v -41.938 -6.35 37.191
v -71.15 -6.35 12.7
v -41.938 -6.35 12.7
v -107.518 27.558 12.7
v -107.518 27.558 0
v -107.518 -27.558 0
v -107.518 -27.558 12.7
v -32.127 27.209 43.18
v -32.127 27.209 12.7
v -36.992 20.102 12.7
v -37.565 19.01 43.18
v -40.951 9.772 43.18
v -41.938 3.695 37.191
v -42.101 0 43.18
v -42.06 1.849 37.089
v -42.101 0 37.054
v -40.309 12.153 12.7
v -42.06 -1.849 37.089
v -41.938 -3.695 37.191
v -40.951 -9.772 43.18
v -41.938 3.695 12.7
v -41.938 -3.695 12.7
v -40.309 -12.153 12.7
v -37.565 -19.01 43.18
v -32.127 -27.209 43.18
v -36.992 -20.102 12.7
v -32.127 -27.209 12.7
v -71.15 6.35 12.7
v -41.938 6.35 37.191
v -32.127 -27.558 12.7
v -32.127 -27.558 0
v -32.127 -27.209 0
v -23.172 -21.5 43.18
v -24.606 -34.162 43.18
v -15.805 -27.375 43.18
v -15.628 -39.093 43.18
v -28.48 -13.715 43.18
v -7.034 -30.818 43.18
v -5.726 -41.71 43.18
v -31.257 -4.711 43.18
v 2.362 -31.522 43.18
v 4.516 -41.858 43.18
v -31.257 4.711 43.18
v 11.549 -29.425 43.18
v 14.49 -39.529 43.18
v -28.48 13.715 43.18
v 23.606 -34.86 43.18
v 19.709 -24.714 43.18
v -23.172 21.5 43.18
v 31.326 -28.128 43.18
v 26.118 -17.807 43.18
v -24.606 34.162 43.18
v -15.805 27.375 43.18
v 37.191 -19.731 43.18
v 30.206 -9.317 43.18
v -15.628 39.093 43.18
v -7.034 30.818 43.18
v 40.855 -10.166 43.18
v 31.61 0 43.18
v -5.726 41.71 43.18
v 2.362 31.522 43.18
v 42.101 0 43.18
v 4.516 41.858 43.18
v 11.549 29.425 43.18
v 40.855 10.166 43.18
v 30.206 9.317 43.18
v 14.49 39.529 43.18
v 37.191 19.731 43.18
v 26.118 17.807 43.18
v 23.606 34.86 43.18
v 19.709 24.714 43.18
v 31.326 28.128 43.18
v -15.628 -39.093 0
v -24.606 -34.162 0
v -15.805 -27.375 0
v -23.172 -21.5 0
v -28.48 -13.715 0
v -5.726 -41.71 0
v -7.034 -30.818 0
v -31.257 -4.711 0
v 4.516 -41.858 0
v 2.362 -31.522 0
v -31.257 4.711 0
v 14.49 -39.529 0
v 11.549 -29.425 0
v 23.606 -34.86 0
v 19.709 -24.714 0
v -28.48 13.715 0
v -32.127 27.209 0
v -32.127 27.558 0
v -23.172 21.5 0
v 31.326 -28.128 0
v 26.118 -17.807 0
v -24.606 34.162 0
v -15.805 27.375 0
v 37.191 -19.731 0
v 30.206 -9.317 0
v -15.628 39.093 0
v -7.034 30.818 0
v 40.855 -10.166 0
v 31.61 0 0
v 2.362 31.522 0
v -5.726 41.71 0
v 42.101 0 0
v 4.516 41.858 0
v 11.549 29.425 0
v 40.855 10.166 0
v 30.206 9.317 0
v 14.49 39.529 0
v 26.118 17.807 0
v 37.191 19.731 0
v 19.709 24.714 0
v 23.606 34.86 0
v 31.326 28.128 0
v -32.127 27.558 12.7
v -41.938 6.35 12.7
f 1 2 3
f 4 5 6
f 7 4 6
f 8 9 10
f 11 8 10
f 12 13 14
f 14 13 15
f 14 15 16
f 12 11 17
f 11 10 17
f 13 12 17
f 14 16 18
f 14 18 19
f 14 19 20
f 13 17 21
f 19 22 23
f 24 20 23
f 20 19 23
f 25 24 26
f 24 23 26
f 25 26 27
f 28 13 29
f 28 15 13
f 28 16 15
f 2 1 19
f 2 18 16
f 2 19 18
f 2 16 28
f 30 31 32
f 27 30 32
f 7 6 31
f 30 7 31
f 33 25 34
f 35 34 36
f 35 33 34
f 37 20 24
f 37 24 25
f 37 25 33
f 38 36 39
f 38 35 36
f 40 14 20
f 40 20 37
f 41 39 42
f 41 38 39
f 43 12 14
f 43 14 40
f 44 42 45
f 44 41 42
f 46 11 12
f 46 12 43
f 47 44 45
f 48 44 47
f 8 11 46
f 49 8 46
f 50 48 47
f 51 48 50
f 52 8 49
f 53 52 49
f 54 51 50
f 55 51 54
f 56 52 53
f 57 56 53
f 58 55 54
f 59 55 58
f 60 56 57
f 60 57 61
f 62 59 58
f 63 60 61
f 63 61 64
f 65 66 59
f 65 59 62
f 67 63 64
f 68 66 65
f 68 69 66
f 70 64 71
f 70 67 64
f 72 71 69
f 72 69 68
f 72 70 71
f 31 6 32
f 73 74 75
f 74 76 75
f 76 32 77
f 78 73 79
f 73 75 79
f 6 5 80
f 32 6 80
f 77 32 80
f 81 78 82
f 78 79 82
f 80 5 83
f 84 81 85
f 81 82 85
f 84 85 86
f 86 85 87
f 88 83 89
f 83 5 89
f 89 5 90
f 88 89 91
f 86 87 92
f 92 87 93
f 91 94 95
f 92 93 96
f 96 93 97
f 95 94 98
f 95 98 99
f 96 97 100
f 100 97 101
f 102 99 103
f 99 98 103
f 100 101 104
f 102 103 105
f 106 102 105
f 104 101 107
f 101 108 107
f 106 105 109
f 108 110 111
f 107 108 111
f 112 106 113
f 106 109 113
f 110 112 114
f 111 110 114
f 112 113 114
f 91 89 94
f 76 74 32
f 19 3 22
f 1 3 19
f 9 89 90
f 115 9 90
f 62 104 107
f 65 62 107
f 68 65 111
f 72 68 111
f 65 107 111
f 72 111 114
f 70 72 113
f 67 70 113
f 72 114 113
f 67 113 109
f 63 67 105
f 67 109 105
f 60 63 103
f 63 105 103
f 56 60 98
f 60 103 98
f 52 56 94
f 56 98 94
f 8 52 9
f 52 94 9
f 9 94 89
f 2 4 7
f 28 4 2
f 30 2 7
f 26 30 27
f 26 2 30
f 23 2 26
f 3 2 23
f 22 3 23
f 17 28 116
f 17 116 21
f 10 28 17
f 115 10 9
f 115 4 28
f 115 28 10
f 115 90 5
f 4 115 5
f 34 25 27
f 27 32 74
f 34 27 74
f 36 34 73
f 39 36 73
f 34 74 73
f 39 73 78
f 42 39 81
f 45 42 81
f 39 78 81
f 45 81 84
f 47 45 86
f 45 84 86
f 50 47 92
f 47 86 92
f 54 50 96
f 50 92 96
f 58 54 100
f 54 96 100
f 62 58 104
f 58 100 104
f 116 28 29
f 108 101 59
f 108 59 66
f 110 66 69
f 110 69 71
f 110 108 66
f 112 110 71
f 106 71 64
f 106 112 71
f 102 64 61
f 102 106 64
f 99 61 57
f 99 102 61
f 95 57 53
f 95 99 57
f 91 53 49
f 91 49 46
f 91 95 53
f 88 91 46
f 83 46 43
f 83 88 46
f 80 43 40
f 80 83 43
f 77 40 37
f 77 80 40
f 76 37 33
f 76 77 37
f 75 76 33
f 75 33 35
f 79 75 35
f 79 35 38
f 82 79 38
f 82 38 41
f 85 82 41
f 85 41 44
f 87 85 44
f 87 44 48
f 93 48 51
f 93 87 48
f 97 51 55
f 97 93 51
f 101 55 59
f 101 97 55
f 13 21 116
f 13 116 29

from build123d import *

# Parameters (mm, degrees)
F1_DEPTH = 12.7
F0_R     = 31.61033
F2_DEPTH = 43.18
F4_DEPTH = 6.35


with BuildPart() as f1:
    # F0 (on Top) → F1 (new body)
    with BuildSketch(Plane.XY):
        with BuildLine():
            Line((-32.126933, 27.557764), (-107.518122, 27.557764))
            Line((-107.518122, 27.557764), (-107.518122, -27.557764))
            Line((-107.518122, -27.557764), (-32.126933, -27.557764))
            Line((-32.126933, -27.557764), (-32.126933, -27.209316))
            ThreePointArc((-32.126933, -27.209316), (-42.100911, 0), (-32.126933, 27.209316))
            Line((-32.126933, 27.209316), (-32.126933, 27.557764))
        make_face()
    extrude(amount=F1_DEPTH)

    # F0 (on Top) → F2 (join)
    with BuildSketch(Plane.XY):
        with BuildLine():
            ThreePointArc((42.100911, 0), (14.489886, 39.52885), (-32.126933, 27.209316))
            ThreePointArc((-32.126933, 27.209316), (-42.100911, 0), (-32.126933, -27.209316))
            ThreePointArc((-32.126933, -27.209316), (14.489886, -39.52885), (42.100911, 0))
        make_face()
        Circle(F0_R, mode=Mode.SUBTRACT)
    extrude(amount=F2_DEPTH)

    # F3 (on Front) → F4 (join, symmetric)
    with BuildSketch(Plane.XZ):
        Polygon((-41.93845, 10.919823), (-41.93845, 37.190702), (-73.273592, 10.919823), align=None)
    extrude(amount=F4_DEPTH, both=True)


solid = f1.part
